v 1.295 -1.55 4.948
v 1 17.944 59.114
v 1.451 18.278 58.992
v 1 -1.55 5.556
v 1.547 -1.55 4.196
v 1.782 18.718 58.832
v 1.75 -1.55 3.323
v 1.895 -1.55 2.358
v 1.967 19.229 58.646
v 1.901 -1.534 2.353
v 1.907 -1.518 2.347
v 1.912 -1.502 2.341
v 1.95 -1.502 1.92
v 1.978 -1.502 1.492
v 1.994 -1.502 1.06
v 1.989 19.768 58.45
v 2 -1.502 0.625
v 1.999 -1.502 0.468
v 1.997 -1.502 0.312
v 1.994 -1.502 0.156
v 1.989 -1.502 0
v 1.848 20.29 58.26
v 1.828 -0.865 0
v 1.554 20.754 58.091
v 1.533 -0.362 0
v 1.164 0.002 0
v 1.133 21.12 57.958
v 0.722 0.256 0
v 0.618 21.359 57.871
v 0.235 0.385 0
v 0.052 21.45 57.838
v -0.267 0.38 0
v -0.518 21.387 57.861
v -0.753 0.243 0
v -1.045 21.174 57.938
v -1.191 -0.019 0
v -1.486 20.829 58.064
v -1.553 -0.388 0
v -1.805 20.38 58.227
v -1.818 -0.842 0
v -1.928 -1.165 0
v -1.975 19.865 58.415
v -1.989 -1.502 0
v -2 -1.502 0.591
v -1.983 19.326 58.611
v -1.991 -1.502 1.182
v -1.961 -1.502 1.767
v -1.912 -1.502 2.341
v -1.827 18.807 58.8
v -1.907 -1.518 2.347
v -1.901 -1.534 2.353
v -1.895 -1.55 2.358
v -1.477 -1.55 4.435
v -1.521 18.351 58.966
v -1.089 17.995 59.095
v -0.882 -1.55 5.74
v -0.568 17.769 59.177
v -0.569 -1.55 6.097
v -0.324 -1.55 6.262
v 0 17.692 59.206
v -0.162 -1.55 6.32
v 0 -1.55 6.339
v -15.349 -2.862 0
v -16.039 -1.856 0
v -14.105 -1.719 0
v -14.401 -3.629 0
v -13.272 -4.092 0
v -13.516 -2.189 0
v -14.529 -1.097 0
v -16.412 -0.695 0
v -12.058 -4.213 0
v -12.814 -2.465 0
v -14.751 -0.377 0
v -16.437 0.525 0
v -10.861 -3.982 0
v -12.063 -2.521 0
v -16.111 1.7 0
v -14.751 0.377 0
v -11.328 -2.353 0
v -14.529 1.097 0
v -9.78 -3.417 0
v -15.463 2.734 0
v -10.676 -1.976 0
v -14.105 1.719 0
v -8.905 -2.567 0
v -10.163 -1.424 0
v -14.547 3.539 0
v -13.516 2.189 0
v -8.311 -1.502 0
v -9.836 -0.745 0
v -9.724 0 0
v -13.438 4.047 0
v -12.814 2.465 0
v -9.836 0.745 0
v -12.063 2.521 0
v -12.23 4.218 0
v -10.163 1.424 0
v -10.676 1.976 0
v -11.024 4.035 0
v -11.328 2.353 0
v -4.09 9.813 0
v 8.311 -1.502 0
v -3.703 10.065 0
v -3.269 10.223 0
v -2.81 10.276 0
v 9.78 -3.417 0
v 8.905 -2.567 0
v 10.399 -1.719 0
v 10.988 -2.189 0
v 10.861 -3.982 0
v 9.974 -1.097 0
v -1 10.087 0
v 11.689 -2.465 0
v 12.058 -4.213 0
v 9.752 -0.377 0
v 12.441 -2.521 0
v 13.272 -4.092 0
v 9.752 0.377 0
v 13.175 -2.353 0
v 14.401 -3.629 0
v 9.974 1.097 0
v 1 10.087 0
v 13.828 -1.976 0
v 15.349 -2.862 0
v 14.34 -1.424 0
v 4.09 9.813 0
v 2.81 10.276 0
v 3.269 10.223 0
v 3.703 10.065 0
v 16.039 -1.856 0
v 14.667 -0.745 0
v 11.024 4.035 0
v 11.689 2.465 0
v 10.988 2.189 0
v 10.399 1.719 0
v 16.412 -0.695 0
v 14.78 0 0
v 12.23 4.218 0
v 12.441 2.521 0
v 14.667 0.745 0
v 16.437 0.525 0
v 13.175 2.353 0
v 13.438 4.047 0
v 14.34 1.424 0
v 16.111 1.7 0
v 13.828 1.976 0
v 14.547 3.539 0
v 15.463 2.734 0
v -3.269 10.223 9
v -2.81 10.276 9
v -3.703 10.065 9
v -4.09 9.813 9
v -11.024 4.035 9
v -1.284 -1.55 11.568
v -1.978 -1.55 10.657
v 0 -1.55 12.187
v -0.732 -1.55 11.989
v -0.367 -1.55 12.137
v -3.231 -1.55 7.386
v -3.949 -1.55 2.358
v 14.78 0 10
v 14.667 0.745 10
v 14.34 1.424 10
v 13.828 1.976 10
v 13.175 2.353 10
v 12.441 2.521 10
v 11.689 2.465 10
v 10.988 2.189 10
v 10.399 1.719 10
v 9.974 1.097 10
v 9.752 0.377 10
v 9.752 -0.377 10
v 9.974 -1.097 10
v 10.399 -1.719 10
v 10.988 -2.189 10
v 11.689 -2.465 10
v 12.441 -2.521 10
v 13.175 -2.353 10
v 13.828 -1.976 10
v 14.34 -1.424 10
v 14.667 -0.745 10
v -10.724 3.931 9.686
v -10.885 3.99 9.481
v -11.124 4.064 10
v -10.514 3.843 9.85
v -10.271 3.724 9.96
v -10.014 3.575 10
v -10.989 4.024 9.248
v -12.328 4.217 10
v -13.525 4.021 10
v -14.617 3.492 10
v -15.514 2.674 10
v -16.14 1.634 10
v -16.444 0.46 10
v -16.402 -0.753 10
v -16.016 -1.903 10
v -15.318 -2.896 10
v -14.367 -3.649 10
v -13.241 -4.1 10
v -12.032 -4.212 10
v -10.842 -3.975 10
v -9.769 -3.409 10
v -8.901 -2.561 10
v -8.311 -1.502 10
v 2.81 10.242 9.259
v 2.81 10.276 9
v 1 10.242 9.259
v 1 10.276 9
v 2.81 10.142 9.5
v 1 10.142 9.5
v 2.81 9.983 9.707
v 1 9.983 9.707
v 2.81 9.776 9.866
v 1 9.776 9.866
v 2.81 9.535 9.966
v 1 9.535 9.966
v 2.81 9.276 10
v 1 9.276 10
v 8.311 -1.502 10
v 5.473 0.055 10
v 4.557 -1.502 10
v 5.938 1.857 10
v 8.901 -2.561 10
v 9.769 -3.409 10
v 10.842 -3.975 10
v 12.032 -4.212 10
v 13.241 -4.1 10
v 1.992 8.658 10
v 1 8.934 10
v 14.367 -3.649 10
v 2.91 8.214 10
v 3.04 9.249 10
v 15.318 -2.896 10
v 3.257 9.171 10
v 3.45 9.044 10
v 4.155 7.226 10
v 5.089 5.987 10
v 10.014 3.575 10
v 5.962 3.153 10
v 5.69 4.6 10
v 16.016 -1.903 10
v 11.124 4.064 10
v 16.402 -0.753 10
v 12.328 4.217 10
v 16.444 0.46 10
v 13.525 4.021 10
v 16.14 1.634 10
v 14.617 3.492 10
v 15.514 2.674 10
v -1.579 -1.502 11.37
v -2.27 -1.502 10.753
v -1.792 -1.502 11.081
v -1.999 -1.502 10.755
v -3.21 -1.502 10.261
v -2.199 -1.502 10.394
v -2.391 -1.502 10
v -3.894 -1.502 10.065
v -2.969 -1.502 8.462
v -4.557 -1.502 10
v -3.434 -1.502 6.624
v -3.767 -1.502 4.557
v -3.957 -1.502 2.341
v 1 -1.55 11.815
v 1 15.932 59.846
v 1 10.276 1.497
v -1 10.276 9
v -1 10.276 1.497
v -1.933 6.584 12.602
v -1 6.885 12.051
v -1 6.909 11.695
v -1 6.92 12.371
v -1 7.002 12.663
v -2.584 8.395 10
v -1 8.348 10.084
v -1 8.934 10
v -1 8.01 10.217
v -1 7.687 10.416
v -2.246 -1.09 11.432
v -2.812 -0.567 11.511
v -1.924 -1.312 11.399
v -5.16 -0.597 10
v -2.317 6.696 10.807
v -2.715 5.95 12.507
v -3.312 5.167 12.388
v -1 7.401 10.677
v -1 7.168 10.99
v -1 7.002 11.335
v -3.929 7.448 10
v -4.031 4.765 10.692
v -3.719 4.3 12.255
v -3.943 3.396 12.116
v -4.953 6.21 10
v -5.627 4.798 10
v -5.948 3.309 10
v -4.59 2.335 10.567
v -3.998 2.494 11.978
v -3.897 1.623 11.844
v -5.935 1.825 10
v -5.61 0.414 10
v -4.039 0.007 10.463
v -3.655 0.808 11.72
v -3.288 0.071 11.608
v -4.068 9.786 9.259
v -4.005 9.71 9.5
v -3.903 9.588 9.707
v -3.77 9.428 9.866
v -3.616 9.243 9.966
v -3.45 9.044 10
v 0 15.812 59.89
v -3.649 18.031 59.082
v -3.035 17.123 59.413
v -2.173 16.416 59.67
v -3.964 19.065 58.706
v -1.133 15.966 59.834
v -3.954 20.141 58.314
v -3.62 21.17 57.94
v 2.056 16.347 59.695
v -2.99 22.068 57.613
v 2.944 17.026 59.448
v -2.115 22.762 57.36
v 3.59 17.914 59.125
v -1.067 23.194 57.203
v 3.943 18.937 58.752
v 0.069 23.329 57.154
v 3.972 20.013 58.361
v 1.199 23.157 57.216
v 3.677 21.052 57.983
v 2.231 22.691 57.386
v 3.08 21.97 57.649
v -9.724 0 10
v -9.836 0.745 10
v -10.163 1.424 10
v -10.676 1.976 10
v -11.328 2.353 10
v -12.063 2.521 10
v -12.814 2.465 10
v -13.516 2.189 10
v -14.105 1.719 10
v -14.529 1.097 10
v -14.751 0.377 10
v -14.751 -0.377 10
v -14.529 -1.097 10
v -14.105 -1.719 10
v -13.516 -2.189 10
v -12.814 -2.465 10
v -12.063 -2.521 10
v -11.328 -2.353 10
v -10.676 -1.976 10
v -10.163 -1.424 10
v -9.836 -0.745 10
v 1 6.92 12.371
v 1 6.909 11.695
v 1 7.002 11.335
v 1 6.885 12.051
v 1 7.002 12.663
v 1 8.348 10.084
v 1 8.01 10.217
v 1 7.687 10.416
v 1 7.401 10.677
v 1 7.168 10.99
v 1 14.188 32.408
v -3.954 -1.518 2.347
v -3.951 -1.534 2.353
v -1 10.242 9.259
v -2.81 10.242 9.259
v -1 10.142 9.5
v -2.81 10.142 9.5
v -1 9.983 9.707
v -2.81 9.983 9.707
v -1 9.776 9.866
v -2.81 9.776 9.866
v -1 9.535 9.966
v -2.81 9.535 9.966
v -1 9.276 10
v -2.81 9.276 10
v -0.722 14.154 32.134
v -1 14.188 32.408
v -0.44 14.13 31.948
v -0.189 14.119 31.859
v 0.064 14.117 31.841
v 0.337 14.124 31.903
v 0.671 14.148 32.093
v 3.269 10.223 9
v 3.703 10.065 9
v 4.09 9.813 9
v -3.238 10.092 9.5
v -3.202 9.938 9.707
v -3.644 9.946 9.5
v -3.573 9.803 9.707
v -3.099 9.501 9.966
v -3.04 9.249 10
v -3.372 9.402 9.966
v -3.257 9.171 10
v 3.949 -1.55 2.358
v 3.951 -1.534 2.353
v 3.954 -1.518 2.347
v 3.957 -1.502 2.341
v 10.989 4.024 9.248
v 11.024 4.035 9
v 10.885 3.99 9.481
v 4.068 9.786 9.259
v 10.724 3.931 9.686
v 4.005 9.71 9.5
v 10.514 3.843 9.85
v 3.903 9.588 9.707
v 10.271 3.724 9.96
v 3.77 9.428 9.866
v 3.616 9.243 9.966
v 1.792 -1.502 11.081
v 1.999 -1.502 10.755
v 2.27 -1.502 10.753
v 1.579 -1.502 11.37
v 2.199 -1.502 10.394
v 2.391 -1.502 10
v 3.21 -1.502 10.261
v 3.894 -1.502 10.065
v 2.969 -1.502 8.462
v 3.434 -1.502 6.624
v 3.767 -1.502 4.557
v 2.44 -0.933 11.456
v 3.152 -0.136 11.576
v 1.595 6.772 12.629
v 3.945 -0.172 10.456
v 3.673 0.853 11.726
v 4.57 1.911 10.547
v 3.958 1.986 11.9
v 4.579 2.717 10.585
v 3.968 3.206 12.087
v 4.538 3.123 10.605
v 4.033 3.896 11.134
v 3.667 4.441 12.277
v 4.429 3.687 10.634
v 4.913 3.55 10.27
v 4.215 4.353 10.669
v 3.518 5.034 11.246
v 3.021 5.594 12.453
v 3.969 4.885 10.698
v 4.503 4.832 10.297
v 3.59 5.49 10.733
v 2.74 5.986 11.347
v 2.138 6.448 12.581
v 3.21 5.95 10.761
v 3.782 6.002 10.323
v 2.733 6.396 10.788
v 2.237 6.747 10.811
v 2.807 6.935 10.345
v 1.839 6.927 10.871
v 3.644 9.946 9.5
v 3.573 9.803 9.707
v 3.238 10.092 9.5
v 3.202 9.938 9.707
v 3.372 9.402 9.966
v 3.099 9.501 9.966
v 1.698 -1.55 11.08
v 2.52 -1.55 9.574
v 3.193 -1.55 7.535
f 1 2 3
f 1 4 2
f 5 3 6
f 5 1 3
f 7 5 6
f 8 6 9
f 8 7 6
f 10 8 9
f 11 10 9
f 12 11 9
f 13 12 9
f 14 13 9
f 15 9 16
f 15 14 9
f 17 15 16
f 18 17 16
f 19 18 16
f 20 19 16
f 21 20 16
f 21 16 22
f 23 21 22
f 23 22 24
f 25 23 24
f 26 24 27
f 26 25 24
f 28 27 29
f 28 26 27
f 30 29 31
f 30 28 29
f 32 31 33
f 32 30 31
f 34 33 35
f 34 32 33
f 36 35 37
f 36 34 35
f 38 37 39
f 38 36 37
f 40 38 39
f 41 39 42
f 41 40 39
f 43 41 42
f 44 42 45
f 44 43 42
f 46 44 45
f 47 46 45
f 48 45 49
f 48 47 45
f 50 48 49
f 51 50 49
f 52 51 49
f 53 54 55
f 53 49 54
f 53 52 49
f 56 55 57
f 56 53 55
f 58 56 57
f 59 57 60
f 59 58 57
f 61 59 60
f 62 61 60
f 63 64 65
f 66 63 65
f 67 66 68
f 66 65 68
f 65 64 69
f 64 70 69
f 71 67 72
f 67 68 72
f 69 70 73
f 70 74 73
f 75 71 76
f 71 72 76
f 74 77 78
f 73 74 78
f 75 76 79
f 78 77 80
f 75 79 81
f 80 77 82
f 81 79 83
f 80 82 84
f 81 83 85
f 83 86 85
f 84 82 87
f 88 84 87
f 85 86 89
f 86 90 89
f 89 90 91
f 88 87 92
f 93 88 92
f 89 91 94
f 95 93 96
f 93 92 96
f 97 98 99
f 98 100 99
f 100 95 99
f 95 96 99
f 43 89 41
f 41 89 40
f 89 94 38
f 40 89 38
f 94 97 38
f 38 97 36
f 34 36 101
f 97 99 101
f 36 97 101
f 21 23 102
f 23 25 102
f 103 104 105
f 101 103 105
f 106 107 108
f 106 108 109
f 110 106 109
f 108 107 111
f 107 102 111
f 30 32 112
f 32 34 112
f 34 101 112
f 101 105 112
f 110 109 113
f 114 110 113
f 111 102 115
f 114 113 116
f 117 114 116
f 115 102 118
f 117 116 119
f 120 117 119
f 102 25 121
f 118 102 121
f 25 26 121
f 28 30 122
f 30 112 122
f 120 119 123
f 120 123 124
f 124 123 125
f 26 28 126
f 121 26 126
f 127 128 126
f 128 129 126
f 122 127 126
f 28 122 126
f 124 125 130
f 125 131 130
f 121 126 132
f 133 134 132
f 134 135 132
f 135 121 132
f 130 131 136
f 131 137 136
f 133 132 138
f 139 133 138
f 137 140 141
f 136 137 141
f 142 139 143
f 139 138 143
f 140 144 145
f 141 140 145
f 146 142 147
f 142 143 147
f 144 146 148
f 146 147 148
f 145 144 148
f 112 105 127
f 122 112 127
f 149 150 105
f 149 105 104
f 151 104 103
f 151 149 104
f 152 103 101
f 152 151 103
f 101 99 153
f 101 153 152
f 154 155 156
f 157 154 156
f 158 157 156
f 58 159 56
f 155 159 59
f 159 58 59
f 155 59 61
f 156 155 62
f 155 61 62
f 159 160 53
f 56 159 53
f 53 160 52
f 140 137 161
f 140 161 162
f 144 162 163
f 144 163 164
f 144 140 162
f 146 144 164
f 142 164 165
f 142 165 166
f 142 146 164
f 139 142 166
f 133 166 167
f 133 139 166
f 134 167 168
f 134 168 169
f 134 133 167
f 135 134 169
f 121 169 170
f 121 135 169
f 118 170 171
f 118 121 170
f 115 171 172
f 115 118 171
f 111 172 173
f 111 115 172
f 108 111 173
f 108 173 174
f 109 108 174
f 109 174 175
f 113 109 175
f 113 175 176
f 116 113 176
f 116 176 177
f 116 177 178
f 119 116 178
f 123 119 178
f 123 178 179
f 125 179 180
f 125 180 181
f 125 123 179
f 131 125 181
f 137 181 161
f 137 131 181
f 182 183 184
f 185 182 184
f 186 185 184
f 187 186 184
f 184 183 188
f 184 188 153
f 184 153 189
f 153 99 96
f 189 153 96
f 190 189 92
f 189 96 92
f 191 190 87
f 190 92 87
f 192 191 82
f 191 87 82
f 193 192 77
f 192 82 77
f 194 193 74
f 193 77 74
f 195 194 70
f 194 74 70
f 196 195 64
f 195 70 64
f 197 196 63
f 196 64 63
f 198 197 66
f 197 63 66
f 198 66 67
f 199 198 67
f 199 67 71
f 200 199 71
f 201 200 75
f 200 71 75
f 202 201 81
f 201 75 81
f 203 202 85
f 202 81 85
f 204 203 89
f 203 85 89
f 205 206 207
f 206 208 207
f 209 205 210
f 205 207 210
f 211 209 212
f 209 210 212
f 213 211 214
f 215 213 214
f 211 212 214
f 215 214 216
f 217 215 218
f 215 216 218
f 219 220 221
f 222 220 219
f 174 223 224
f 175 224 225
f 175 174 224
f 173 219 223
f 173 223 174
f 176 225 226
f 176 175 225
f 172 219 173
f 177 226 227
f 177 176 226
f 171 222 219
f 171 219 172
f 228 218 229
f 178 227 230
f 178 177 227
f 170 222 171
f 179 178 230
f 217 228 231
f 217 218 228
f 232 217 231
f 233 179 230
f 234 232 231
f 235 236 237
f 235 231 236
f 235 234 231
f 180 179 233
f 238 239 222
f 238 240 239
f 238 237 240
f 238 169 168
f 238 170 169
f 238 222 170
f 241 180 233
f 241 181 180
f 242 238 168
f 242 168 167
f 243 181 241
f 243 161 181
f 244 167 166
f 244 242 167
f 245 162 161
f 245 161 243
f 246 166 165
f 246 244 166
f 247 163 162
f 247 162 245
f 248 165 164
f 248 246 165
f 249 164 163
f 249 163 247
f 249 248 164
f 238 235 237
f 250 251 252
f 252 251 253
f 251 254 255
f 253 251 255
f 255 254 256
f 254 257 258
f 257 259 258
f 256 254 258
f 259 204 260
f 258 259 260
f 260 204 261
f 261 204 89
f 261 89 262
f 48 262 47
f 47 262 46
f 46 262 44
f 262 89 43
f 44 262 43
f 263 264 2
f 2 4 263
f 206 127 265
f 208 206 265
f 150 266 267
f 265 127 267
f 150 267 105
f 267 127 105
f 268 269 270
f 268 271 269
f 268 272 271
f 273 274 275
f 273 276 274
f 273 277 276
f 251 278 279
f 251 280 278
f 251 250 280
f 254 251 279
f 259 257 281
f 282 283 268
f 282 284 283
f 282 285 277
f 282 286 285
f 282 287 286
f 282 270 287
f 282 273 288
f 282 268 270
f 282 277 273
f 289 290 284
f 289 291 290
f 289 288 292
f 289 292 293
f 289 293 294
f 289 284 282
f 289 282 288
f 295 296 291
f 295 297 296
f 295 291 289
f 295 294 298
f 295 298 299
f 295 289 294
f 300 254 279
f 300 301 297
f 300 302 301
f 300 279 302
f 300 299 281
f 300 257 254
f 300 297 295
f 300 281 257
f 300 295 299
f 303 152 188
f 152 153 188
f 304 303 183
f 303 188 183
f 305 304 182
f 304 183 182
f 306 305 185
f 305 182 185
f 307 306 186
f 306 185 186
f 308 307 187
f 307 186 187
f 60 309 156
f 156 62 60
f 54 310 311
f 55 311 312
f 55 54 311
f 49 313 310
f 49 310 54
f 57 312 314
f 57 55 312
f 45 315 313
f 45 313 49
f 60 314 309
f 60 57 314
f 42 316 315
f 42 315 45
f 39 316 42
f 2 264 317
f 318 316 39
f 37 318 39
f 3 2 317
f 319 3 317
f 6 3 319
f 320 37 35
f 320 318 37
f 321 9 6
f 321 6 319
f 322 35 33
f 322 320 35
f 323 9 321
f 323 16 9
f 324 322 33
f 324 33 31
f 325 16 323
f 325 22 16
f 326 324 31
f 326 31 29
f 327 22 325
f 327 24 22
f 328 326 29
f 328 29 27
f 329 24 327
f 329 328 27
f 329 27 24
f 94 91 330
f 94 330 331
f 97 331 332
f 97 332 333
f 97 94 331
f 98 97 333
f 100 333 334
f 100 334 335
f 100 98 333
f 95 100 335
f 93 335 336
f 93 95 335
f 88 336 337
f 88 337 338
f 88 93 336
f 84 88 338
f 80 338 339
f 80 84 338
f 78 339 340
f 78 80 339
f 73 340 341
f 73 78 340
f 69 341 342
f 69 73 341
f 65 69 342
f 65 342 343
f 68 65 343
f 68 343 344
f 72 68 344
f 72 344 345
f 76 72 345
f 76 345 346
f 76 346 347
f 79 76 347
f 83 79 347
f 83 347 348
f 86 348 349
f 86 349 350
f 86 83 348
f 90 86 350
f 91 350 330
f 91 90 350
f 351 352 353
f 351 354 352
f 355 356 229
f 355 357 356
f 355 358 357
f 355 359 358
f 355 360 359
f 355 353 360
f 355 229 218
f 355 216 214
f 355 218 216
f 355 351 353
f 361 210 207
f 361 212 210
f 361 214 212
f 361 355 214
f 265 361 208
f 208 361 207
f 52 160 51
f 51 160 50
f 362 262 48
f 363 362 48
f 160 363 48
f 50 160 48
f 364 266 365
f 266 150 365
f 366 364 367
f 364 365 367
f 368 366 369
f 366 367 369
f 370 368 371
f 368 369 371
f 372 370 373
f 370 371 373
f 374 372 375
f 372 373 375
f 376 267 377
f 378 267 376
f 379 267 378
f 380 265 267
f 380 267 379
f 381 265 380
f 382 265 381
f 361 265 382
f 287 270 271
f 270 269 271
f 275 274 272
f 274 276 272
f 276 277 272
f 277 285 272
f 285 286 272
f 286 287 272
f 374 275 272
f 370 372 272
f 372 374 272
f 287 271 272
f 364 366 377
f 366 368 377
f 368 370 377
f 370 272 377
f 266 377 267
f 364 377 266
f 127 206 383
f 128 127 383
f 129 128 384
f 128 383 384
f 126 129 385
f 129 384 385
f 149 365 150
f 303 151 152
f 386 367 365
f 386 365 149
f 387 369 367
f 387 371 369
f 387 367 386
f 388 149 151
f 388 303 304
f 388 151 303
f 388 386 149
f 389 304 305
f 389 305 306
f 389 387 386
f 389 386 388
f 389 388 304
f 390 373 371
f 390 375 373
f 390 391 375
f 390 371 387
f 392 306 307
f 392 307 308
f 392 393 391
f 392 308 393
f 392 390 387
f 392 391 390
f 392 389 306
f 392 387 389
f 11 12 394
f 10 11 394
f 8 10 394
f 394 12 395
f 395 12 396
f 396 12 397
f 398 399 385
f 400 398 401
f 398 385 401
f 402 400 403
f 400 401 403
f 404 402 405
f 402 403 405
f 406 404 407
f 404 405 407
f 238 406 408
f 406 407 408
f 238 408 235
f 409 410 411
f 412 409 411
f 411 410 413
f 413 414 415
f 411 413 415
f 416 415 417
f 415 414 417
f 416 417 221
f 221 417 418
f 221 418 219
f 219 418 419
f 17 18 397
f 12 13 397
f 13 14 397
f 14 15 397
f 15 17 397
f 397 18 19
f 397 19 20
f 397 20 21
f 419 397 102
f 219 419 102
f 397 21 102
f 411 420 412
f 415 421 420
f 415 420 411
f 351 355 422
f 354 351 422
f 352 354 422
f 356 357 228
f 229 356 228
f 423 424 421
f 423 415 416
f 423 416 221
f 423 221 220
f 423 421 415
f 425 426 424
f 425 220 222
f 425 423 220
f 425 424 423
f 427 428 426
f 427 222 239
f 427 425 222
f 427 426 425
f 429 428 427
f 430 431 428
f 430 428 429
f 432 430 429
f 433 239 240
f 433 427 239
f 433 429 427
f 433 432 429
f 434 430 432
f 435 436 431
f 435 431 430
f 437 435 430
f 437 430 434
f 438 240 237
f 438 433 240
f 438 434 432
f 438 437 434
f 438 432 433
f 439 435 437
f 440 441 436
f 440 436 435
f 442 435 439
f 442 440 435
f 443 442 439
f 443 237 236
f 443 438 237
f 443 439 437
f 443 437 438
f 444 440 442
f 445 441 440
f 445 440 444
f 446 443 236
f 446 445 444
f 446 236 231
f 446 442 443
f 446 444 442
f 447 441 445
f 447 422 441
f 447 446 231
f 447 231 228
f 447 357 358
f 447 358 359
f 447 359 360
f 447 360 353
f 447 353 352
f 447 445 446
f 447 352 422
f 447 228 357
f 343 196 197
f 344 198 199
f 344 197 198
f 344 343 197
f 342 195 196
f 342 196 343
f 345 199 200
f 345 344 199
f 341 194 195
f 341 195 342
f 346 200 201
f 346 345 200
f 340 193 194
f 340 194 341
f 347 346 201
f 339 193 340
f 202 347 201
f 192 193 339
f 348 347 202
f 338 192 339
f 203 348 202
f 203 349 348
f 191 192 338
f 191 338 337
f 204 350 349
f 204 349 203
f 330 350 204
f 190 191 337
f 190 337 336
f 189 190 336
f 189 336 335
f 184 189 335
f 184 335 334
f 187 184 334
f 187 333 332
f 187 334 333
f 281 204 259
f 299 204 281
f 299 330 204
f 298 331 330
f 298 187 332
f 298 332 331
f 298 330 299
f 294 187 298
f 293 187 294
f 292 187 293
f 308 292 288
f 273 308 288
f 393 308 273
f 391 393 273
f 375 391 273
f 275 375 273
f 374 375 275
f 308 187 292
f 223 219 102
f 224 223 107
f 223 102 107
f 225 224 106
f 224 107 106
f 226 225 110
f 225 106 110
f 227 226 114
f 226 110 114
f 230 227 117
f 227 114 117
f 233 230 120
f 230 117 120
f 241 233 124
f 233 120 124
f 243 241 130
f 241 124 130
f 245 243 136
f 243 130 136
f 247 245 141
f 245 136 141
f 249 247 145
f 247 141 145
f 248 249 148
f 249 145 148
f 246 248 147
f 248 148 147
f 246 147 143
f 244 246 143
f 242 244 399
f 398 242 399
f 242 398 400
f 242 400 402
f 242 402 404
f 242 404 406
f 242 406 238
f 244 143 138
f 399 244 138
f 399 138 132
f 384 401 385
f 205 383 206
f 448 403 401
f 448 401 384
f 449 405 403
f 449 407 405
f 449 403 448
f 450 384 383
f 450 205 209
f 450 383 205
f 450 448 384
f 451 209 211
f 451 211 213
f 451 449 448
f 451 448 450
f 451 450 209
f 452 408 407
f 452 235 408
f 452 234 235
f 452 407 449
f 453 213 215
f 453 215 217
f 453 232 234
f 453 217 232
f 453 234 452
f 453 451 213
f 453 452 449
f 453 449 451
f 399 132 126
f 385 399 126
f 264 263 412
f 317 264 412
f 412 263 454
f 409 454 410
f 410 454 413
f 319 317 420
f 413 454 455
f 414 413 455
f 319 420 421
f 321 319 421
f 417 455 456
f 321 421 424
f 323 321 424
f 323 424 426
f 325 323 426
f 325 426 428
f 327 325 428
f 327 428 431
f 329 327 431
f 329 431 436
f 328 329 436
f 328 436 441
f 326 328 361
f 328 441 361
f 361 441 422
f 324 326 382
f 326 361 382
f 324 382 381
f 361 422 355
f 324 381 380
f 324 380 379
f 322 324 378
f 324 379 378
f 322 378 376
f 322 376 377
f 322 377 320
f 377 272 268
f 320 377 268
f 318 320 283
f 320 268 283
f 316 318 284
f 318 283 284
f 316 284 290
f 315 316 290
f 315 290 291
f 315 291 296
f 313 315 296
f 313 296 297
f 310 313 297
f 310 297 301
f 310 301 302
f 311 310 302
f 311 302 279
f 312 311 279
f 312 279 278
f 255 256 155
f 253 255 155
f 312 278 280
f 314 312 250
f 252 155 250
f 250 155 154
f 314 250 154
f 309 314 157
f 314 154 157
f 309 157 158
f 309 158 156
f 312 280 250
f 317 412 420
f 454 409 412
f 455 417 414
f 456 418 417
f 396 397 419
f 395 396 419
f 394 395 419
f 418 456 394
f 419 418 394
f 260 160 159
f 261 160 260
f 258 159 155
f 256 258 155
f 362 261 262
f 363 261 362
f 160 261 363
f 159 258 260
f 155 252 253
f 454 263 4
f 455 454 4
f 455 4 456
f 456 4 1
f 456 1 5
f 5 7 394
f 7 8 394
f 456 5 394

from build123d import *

# Parameters (mm, degrees)
BOX001_W                    = 10
BOX001_H                    = 10
BOX001_DEPTH                = 18
PAD001_DEPTH                = 1
BOX_W                       = 1
BOX_H                       = 4
BOX_DEPTH                   = 62
BOX_PLACEMENT_ANGLE         = 340
CYLINDER_R                  = 2
CYLINDER_DEPTH              = 67
CYLINDER_PLACEMENT_ANGLE    = 340
CYLINDER001_R               = 4
CYLINDER001_DEPTH           = 60
CYLINDER001_PLACEMENT_ANGLE = 20
SKETCH_R                    = 2.527902
PAD_DEPTH                   = 10
FILLET_R                    = 2
FILLET001_R                 = 2
FILLET002_R                 = 2
FILLET004_R                 = 1


with BuildPart() as box001:
    # Box001 → Box001 (new body)
    with BuildSketch(Plane(origin=(-4.48, -1.55, 0), x_dir=(0, -1, 0), z_dir=(0, 0, 1))):
        with Locations((5, 5)):
            Rectangle(BOX001_W, BOX001_H)
    extrude(amount=BOX001_DEPTH)


with BuildPart() as body001:
    # Sketch001 → Pad001 (new body, symmetric)
    with BuildSketch(Plane.YZ):
        Polygon((11.126045, 25.12734), (5.15667, 9.780665), (10.086619, 0), (14.214679, 32.616486), align=None)
    extrude(amount=PAD001_DEPTH, both=True)


with BuildPart() as box:
    # Box → Box (new body)
    with BuildSketch(Plane.XY):
        with Locations((0.5, 2)):
            Rectangle(BOX_W, BOX_H)
    extrude(amount=BOX_DEPTH)


with BuildPart() as box_1:
    # Box placement: moved
    add(box.part.moved(Location((0, -5.296136, 2.991813))).rotate(Axis((0, -5.296136, 2.991813), (1, 0, 0)), BOX_PLACEMENT_ANGLE))


with BuildPart() as cylinder:
    # Cylinder → Cylinder (new body)
    with BuildSketch(Plane.XY):
        Circle(CYLINDER_R)
    extrude(amount=CYLINDER_DEPTH)


with BuildPart() as cylinder_1:
    # Cylinder placement: moved
    add(cylinder.part.moved(Location((0, -2.318081, -1.61877))).rotate(Axis((0, -2.318081, -1.61877), (1, 0, 0)), CYLINDER_PLACEMENT_ANGLE))


with BuildPart() as cylinder001:
    # Cylinder001 → Cylinder001 (new body)
    with BuildSketch(Plane.XY):
        Circle(CYLINDER001_R)
    extrude(amount=CYLINDER001_DEPTH)


with BuildPart() as cylinder001_1:
    # Cylinder001 placement: moved
    add(cylinder001.part.moved(Location((0, -0.95, 2.14))).rotate(Axis((0, -0.95, 2.14), (-1, 0, 0)), CYLINDER001_PLACEMENT_ANGLE))


with BuildPart() as cut002:
    # Sketch → Pad (new body)
    with BuildSketch(Plane.XY):
        with BuildLine():
            ThreePointArc((-11.024148, 4.03498), (-16.038919, -1.856194), (-8.310522, -1.501592))
            Line((-8.310522, -1.501592), (0, -1.501592))
            Line((8.310522, -1.501592), (0, -1.501592))
            ThreePointArc((8.310522, -1.501592), (16.038919, -1.856194), (11.024148, 4.03498))
            Line((11.024148, 4.03498), (3.534046, 10.276075))
            Line((3.534046, 10.276075), (0, 10.276075))
            Line((-3.534046, 10.276075), (0, 10.276075))
            Line((-11.024148, 4.03498), (-3.534046, 10.276075))
        make_face()
        with Locations((-12.251753, 0)):
            Circle(SKETCH_R, mode=Mode.SUBTRACT)
        with Locations((12.251753, 0)):
            Circle(SKETCH_R, mode=Mode.SUBTRACT)
    extrude(amount=PAD_DEPTH)

    # Fusion: union Cylinder001
    add(cylinder001_1.part)

    # Cut: cut Cylinder
    add(cylinder_1.part, mode=Mode.SUBTRACT)

    # Cut001: cut Box
    add(box_1.part, mode=Mode.SUBTRACT)

    # Fillet
    fillet_edges = [cut002.edges().sort_by_distance(p)[0] for p in [
        (-1.866147, 5.675875, 10),
    ]]
    fillet(fillet_edges, radius=FILLET_R)

    # Fusion001: union Body001
    add(body001.part)

    # Fillet001
    fillet001_edges = [cut002.edges().sort_by_distance(p)[0] for p in [
        (-3.534046, 10.276075, 5),
    ]]
    fillet(fillet001_edges, radius=FILLET001_R)

    # Fillet002
    fillet002_edges = [cut002.edges().sort_by_distance(p)[0] for p in [
        (3.534046, 10.276075, 5),
    ]]
    fillet(fillet002_edges, radius=FILLET002_R)

    # Fillet004
    fillet004_edges = [cut002.edges().sort_by_distance(p)[0] for p in [
        (1.905002, 10.276075, 10),
        (-1.905002, 10.276075, 10),
    ]]
    fillet(fillet004_edges, radius=FILLET004_R)

    # Cut002: cut Box001
    add(box001.part, mode=Mode.SUBTRACT)


solid = cut002.part
